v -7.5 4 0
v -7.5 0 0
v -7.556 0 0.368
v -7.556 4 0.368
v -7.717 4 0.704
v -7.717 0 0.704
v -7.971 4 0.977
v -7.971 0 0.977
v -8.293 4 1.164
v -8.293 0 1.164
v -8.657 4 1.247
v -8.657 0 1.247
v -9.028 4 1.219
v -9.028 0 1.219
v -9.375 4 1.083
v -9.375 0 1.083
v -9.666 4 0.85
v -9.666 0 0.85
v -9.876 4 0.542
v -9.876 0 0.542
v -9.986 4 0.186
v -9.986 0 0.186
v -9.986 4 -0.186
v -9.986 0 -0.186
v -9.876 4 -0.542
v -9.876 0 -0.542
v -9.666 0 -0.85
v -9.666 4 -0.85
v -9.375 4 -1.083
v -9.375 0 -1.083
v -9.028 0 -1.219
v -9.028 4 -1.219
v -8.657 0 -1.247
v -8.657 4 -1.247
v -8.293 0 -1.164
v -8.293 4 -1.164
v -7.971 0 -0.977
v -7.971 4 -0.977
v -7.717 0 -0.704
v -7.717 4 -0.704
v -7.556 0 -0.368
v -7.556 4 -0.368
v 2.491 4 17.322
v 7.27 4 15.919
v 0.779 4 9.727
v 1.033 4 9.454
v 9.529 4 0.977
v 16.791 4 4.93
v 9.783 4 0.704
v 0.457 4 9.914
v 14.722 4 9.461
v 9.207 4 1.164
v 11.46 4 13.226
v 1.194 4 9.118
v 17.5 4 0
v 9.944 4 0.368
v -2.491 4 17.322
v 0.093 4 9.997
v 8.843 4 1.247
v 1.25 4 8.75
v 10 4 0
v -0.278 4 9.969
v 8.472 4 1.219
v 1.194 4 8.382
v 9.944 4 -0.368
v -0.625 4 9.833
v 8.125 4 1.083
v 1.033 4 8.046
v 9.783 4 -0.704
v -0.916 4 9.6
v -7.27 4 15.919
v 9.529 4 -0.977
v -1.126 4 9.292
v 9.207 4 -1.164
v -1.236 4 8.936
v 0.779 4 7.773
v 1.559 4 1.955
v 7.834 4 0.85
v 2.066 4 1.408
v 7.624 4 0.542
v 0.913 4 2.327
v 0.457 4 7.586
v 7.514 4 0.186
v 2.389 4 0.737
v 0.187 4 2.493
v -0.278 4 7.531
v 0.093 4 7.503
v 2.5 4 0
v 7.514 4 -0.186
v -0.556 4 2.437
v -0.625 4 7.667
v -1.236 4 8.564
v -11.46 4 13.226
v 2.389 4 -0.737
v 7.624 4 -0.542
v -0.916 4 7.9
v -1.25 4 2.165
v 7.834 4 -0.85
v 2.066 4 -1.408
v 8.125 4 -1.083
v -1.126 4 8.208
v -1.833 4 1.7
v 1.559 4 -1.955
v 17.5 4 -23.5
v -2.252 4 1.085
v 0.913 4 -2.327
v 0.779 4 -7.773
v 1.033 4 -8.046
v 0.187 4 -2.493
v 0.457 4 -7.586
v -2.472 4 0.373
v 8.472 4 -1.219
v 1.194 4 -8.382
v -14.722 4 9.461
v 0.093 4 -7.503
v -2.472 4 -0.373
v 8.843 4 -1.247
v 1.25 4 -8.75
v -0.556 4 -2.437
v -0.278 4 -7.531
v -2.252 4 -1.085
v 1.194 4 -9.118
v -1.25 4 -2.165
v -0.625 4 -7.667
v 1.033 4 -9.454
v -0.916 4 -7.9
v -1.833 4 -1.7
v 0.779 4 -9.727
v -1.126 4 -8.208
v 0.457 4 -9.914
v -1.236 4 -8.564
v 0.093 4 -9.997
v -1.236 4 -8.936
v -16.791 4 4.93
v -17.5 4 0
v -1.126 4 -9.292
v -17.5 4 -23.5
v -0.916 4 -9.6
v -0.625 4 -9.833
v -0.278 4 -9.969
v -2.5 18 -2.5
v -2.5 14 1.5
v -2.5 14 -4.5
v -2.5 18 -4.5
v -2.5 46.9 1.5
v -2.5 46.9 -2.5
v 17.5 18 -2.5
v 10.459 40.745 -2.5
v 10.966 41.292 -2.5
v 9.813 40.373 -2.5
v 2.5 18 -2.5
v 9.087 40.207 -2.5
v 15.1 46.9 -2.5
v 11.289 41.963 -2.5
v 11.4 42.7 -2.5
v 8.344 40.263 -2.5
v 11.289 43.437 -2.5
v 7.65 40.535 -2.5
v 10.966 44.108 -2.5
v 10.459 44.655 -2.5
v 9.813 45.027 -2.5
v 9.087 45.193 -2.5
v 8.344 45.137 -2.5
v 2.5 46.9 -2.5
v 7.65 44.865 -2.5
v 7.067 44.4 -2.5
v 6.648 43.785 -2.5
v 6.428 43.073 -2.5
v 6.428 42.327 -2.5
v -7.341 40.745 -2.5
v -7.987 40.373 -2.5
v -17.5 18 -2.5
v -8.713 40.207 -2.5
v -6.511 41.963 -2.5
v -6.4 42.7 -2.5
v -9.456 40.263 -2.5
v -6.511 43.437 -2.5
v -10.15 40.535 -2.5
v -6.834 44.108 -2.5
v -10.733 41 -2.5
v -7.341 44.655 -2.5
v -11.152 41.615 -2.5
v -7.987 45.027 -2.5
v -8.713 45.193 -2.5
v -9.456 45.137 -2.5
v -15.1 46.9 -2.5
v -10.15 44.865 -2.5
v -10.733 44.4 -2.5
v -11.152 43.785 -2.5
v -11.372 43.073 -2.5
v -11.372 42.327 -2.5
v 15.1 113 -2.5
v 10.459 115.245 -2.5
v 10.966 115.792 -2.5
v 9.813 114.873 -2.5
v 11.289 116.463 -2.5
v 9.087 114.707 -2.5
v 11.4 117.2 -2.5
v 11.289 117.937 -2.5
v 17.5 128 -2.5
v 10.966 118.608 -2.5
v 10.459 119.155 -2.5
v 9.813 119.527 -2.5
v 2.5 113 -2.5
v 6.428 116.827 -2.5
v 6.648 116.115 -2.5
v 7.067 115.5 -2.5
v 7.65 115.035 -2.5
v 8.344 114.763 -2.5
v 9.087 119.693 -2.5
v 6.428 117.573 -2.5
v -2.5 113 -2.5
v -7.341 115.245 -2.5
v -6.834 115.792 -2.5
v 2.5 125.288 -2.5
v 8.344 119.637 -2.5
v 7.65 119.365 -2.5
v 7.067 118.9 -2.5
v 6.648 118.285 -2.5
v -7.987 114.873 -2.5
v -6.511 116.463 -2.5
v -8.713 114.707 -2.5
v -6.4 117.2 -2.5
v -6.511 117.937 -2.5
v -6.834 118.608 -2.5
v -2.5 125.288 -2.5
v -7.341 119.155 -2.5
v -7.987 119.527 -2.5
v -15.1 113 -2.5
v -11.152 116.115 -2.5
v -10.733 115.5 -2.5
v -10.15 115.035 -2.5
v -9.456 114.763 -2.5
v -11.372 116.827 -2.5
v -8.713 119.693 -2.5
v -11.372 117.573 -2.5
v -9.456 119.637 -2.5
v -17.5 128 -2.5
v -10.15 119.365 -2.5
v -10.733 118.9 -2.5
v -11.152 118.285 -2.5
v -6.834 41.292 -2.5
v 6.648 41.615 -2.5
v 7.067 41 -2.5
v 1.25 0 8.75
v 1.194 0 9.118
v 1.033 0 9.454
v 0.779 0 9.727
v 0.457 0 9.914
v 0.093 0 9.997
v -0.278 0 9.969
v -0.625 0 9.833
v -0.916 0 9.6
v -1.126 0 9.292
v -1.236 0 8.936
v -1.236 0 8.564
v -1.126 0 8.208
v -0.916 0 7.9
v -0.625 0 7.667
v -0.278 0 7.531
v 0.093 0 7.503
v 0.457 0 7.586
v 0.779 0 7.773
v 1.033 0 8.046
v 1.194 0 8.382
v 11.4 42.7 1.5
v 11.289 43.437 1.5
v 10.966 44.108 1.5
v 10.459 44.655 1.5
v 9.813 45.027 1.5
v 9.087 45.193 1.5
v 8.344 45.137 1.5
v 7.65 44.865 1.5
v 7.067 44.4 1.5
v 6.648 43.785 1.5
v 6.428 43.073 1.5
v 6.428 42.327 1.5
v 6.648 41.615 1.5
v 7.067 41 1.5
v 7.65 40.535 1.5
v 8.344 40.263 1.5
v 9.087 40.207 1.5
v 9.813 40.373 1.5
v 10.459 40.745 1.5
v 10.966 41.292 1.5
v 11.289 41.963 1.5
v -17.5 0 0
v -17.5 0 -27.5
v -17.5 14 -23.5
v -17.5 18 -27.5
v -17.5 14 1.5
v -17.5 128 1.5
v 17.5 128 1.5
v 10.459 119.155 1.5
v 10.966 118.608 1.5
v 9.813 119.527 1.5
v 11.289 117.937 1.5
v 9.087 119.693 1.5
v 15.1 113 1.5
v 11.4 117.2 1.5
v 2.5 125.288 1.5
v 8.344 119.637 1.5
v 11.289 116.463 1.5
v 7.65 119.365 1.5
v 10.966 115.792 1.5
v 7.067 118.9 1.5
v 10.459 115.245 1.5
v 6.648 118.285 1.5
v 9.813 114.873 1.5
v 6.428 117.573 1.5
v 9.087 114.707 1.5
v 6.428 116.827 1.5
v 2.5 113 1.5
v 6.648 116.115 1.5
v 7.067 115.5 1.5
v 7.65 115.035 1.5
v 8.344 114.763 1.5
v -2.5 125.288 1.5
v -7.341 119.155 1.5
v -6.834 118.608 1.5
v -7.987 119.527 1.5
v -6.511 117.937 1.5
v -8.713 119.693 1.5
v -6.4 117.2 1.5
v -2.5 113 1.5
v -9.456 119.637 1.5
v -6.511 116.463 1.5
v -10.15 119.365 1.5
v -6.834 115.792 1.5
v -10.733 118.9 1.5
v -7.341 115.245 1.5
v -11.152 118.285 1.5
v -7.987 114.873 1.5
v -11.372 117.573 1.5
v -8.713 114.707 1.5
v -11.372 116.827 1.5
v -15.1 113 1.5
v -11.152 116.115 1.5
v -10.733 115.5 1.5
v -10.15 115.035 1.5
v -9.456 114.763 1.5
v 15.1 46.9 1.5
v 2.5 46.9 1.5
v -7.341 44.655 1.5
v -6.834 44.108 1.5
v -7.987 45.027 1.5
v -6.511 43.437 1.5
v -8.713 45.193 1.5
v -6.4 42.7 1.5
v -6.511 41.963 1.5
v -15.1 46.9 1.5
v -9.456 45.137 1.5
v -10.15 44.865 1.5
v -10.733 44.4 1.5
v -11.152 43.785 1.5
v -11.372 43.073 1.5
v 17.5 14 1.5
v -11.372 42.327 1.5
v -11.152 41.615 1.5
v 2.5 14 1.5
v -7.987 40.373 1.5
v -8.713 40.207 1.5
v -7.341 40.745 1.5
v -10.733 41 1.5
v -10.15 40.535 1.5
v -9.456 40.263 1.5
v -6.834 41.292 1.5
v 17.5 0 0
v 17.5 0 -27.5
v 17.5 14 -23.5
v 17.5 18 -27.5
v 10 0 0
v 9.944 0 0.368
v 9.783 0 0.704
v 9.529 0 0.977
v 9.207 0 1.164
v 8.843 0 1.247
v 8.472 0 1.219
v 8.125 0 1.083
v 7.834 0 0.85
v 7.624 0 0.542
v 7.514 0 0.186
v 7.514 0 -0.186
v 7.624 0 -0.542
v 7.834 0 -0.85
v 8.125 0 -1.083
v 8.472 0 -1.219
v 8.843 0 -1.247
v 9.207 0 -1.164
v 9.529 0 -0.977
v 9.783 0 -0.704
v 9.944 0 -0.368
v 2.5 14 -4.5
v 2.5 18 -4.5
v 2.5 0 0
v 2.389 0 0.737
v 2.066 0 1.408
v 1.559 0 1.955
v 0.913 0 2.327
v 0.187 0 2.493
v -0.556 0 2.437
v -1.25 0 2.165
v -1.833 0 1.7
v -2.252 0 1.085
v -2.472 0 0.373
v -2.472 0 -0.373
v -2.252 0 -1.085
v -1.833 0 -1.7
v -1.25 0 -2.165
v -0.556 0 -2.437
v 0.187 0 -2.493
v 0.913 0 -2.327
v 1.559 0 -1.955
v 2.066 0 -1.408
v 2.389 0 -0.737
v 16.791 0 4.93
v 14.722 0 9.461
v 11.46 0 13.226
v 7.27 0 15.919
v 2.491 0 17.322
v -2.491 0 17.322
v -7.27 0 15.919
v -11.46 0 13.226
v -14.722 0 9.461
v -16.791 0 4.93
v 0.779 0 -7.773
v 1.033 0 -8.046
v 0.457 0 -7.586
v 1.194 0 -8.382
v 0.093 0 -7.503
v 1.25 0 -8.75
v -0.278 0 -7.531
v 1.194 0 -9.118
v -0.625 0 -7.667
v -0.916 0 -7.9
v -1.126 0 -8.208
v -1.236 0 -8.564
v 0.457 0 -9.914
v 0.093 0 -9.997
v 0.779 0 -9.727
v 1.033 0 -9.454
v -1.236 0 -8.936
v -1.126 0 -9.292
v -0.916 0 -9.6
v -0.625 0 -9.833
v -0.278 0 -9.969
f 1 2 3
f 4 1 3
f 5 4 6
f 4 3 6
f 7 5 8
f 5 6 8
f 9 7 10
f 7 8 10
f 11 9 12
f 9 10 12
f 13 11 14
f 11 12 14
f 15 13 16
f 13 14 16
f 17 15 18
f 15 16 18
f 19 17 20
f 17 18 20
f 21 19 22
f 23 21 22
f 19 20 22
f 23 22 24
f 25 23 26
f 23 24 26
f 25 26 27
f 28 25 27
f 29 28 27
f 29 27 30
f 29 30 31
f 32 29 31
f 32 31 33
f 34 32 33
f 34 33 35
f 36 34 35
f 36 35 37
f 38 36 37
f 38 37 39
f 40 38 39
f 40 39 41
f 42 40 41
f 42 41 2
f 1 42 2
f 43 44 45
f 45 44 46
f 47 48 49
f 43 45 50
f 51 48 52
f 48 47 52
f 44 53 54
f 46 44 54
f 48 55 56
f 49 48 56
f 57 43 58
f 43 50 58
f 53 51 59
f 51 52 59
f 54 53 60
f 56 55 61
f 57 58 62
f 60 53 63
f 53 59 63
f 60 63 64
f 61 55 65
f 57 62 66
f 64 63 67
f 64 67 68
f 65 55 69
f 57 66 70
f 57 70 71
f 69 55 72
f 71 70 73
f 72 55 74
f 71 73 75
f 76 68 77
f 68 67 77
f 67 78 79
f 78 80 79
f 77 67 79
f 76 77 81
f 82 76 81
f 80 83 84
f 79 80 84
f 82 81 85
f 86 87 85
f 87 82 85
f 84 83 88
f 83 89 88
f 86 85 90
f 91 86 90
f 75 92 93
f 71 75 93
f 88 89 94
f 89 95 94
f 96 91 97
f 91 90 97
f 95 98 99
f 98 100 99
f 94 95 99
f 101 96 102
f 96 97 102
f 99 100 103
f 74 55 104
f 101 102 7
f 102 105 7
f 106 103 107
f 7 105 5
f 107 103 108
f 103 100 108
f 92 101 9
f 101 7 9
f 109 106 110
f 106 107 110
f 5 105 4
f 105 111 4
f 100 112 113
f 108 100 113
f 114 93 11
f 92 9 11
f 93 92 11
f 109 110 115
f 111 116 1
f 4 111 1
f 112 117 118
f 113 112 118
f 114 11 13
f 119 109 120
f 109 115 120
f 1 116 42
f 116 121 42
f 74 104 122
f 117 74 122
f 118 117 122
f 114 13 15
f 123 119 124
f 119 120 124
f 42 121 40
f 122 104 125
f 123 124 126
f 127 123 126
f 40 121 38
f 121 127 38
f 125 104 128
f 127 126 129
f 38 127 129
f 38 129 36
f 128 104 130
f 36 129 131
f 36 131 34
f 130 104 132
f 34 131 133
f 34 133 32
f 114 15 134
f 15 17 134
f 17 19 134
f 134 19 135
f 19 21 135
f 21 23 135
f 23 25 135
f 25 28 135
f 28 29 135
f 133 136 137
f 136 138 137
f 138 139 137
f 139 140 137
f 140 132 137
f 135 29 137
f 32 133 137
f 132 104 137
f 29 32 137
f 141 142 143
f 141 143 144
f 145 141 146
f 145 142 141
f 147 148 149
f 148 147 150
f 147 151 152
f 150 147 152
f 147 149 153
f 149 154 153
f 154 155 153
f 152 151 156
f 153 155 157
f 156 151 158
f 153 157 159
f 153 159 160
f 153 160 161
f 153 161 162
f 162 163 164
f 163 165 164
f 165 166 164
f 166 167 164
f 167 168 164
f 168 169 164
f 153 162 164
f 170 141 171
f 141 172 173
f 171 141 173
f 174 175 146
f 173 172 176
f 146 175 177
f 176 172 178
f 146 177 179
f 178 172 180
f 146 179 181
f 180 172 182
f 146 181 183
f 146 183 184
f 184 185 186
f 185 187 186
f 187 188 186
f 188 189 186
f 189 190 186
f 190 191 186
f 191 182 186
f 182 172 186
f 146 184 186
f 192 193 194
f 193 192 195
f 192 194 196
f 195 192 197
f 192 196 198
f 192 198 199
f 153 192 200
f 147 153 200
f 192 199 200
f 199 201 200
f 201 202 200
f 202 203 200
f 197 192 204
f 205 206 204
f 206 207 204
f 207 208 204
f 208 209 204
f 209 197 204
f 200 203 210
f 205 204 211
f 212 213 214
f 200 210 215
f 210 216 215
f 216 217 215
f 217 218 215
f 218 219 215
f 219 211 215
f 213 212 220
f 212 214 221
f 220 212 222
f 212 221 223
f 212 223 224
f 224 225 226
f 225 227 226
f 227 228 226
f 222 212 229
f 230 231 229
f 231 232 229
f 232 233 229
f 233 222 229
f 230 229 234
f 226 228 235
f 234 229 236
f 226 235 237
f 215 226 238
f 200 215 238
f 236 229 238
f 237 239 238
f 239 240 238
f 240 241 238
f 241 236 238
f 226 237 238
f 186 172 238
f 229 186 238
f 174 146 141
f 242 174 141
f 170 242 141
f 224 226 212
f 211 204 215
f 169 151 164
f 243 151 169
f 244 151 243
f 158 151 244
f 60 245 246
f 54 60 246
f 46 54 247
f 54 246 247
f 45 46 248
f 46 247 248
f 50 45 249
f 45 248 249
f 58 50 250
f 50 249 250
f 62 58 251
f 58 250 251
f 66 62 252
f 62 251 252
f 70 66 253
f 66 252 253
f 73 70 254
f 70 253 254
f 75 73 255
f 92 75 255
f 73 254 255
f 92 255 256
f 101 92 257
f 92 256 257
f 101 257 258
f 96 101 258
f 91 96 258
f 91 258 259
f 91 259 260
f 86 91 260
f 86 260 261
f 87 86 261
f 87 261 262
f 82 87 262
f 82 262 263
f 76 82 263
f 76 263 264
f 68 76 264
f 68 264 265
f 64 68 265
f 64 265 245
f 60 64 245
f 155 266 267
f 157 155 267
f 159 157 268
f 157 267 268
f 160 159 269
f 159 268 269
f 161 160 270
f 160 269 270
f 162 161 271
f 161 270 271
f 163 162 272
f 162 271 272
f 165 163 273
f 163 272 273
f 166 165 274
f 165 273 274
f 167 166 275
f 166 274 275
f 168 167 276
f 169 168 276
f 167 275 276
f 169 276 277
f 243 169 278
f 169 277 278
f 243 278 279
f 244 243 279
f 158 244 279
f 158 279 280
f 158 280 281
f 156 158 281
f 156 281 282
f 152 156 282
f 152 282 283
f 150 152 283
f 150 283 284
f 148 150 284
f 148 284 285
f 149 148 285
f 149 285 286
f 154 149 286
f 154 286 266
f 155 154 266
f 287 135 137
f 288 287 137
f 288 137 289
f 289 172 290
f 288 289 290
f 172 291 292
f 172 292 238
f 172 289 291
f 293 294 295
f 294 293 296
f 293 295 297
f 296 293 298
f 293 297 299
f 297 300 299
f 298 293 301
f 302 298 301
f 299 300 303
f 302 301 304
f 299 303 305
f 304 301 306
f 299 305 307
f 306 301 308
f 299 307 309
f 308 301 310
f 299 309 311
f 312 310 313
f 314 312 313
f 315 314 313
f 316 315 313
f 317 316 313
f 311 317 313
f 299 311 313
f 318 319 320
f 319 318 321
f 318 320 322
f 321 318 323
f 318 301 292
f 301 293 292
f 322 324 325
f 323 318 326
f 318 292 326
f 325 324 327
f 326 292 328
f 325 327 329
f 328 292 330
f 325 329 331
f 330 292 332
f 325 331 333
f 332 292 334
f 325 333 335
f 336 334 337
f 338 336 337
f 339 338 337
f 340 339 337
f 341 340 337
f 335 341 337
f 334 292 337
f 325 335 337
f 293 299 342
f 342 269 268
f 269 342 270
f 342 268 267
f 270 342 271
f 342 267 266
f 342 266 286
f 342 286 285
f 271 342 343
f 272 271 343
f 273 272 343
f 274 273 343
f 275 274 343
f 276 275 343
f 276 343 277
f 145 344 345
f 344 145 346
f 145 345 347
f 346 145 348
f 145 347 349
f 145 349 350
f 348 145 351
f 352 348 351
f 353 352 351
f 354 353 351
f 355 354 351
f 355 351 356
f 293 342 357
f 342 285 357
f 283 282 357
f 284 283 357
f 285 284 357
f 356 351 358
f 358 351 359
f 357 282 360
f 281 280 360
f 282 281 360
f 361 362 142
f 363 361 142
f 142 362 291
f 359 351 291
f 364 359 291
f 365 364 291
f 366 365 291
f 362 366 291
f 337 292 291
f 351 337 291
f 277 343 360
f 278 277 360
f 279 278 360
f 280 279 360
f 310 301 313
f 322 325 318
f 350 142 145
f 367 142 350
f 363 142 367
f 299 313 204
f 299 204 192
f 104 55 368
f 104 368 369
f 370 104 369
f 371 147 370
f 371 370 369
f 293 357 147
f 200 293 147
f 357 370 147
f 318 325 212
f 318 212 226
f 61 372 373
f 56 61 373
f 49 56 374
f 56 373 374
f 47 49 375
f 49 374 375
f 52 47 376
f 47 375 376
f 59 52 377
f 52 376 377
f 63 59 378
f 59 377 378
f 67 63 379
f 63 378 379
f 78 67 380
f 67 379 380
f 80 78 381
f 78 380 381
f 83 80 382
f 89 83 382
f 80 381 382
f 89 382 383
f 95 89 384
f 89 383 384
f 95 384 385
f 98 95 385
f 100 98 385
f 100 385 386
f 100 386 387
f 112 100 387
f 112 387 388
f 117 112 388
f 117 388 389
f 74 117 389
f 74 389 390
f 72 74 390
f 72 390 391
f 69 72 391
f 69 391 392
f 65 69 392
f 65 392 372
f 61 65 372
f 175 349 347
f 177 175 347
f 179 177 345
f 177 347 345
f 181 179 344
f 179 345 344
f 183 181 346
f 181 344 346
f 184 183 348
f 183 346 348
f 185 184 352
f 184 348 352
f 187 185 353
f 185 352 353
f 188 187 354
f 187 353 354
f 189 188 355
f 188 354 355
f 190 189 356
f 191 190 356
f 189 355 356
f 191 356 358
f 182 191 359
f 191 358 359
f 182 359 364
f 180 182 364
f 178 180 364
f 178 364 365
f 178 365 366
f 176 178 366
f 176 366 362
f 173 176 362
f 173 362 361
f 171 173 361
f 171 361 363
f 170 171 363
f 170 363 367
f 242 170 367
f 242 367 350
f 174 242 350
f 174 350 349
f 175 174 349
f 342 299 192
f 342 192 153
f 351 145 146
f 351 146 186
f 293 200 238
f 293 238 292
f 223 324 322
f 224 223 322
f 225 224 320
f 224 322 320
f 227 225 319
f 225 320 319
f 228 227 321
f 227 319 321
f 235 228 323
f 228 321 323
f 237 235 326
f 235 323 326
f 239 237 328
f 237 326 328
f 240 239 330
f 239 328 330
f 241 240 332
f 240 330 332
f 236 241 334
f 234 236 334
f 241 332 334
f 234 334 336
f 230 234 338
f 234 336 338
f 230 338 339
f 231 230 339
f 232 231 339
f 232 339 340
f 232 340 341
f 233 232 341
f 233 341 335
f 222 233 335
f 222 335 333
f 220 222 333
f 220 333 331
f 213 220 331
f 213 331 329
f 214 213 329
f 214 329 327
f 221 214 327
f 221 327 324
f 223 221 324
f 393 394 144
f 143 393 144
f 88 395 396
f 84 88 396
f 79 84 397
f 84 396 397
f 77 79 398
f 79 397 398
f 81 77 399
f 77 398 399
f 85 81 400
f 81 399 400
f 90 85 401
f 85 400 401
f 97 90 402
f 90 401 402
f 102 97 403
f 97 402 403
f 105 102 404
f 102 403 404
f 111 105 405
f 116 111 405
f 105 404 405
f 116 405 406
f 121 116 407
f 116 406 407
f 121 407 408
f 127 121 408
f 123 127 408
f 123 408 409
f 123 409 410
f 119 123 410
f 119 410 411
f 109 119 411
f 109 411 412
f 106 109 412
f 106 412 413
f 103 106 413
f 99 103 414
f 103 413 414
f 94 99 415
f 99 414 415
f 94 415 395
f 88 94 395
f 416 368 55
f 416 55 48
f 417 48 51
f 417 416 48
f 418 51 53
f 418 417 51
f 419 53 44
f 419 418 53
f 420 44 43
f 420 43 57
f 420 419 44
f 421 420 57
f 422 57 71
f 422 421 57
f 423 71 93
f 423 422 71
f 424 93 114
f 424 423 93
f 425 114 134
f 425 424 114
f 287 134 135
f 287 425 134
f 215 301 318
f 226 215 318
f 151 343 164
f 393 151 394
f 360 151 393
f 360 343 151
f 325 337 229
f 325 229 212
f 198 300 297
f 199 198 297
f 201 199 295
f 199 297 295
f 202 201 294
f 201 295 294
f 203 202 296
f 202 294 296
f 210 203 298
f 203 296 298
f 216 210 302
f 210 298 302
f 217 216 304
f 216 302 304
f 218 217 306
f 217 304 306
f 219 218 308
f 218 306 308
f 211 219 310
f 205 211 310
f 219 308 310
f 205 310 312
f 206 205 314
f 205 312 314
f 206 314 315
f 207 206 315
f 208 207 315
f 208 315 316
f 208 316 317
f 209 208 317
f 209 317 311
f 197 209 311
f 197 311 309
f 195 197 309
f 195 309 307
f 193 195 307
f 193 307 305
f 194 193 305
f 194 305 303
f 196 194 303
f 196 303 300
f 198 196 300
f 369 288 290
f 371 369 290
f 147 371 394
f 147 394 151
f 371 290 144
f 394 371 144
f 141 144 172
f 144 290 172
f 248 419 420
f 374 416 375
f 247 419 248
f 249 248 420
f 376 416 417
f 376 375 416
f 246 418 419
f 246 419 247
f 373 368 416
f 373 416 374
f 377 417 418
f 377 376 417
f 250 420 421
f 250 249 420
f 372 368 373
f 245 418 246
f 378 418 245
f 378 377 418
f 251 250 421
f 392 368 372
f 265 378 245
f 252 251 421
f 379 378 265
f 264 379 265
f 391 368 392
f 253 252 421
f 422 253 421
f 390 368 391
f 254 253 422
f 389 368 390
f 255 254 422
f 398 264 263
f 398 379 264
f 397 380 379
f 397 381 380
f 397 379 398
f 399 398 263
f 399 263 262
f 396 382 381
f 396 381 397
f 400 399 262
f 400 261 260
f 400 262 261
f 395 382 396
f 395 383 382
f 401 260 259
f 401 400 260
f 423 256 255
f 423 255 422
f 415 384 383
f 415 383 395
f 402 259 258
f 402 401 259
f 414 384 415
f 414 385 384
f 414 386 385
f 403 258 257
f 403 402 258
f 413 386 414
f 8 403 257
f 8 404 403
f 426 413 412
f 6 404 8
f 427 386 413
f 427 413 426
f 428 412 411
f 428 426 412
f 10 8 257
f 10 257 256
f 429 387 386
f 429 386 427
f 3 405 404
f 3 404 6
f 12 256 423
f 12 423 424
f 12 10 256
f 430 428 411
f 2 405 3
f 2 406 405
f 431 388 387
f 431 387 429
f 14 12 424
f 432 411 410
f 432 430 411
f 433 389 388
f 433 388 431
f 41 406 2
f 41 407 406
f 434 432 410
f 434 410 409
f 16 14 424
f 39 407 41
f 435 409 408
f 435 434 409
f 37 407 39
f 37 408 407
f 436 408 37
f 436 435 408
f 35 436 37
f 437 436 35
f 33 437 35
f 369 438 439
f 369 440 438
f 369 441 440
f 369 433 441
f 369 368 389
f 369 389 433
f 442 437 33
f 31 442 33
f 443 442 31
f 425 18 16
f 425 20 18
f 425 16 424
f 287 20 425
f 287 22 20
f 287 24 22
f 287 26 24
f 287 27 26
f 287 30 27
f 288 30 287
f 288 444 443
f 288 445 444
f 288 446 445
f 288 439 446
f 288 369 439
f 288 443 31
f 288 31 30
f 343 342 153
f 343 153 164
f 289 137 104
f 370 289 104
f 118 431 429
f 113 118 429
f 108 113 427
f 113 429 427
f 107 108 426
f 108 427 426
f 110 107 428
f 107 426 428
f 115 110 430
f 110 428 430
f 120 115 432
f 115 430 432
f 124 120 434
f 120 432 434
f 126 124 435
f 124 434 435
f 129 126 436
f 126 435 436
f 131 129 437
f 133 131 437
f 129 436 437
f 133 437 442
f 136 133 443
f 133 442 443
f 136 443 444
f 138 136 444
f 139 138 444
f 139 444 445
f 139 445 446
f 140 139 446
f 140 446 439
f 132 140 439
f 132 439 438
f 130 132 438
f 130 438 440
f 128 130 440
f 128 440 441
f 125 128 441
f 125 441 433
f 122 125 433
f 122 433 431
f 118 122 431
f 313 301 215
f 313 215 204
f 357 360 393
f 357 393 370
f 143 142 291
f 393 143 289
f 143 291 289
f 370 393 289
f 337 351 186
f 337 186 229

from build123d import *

# Parameters (mm, degrees)
BOSS_EXTRUDE2_DEPTH = 4
SKETCH4_W           = 35
SKETCH4_H           = 4
BOSS_EXTRUDE3_DEPTH = 10
BOSS_EXTRUDE4_DEPTH = 35
SKETCH9_R           = 2.5
CUT_EXTRUDE1_DEPTH  = 6
SKETCH10_R          = 1.25
CUT_EXTRUDE2_DEPTH  = 6
SKETCH11_R          = 2.5
CUT_EXTRUDE3_DEPTH  = 4


with BuildPart() as part:
    # Sketch3 → Boss-Extrude2 (new body)
    with BuildSketch(Plane(origin=(0, 0, 0), x_dir=(1, 0, 0), z_dir=(0, 1, 0))):
        with BuildLine():
            Line((-17.5, 0), (-17.5, 27.5))
            Line((-17.5, 27.5), (17.5, 27.5))
            Line((17.5, 27.5), (17.5, 0))
            ThreePointArc((17.5, 0), (0, -17.5), (-17.5, 0))
        make_face()
    extrude(amount=BOSS_EXTRUDE2_DEPTH)

    # Sketch4 → Boss-Extrude3 (add)
    with BuildSketch(Plane(origin=(0, 4, 0), x_dir=(1, 0, 0), z_dir=(0, 1, 0))):
        with Locations((0, 25.5)):
            Rectangle(SKETCH4_W, SKETCH4_H)
    extrude(amount=BOSS_EXTRUDE3_DEPTH)

    # Sketch6 → Boss-Extrude4 (add)
    with BuildSketch(Plane.ZY.offset(17.5)):
        Polygon((-27.5, 14), (-27.5, 18), (-2.5, 18), (-2.5, 128), (1.5, 128), (1.5, 14), align=None)
    extrude(amount=-BOSS_EXTRUDE4_DEPTH)

    # Sketch9 → Cut-Extrude1 (cut)
    with BuildSketch(Plane.XY.offset(1.5)):
        with Locations((-8.9, 117.2)):
            Circle(SKETCH9_R)
        with Locations((8.9, 117.2)):
            Circle(SKETCH9_R)
        with Locations((-8.9, 42.7)):
            Circle(SKETCH9_R)
        with Locations((8.9, 42.7)):
            Circle(SKETCH9_R)
        Polygon((-15.1, 113), (-2.5, 113), (-2.5, 125.287895972), (0, 125.287895972), (2.5, 125.287895972), (2.5, 113), (15.1, 113), (15.1, 46.9), (2.5, 46.9), (2.5, 10), (-2.5, 10), (-2.5, 46.9), (-15.1, 46.9), align=None)
    extrude(amount=-CUT_EXTRUDE1_DEPTH, mode=Mode.SUBTRACT)

    # Sketch10 → Cut-Extrude2 (cut)
    with BuildSketch(Plane.XZ):
        with Locations((-8.75, 0)):
            Circle(SKETCH10_R)
        with Locations((8.75, 0)):
            Circle(SKETCH10_R)
        with Locations((0, 8.75)):
            Circle(SKETCH10_R)
        with Locations((0, -8.75)):
            Circle(SKETCH10_R)
    extrude(amount=-CUT_EXTRUDE2_DEPTH, mode=Mode.SUBTRACT)

    # Sketch11 → Cut-Extrude3 (cut)
    with BuildSketch(Plane.XZ):
        Circle(SKETCH11_R)
    extrude(amount=-CUT_EXTRUDE3_DEPTH, mode=Mode.SUBTRACT)


solid = part.part
